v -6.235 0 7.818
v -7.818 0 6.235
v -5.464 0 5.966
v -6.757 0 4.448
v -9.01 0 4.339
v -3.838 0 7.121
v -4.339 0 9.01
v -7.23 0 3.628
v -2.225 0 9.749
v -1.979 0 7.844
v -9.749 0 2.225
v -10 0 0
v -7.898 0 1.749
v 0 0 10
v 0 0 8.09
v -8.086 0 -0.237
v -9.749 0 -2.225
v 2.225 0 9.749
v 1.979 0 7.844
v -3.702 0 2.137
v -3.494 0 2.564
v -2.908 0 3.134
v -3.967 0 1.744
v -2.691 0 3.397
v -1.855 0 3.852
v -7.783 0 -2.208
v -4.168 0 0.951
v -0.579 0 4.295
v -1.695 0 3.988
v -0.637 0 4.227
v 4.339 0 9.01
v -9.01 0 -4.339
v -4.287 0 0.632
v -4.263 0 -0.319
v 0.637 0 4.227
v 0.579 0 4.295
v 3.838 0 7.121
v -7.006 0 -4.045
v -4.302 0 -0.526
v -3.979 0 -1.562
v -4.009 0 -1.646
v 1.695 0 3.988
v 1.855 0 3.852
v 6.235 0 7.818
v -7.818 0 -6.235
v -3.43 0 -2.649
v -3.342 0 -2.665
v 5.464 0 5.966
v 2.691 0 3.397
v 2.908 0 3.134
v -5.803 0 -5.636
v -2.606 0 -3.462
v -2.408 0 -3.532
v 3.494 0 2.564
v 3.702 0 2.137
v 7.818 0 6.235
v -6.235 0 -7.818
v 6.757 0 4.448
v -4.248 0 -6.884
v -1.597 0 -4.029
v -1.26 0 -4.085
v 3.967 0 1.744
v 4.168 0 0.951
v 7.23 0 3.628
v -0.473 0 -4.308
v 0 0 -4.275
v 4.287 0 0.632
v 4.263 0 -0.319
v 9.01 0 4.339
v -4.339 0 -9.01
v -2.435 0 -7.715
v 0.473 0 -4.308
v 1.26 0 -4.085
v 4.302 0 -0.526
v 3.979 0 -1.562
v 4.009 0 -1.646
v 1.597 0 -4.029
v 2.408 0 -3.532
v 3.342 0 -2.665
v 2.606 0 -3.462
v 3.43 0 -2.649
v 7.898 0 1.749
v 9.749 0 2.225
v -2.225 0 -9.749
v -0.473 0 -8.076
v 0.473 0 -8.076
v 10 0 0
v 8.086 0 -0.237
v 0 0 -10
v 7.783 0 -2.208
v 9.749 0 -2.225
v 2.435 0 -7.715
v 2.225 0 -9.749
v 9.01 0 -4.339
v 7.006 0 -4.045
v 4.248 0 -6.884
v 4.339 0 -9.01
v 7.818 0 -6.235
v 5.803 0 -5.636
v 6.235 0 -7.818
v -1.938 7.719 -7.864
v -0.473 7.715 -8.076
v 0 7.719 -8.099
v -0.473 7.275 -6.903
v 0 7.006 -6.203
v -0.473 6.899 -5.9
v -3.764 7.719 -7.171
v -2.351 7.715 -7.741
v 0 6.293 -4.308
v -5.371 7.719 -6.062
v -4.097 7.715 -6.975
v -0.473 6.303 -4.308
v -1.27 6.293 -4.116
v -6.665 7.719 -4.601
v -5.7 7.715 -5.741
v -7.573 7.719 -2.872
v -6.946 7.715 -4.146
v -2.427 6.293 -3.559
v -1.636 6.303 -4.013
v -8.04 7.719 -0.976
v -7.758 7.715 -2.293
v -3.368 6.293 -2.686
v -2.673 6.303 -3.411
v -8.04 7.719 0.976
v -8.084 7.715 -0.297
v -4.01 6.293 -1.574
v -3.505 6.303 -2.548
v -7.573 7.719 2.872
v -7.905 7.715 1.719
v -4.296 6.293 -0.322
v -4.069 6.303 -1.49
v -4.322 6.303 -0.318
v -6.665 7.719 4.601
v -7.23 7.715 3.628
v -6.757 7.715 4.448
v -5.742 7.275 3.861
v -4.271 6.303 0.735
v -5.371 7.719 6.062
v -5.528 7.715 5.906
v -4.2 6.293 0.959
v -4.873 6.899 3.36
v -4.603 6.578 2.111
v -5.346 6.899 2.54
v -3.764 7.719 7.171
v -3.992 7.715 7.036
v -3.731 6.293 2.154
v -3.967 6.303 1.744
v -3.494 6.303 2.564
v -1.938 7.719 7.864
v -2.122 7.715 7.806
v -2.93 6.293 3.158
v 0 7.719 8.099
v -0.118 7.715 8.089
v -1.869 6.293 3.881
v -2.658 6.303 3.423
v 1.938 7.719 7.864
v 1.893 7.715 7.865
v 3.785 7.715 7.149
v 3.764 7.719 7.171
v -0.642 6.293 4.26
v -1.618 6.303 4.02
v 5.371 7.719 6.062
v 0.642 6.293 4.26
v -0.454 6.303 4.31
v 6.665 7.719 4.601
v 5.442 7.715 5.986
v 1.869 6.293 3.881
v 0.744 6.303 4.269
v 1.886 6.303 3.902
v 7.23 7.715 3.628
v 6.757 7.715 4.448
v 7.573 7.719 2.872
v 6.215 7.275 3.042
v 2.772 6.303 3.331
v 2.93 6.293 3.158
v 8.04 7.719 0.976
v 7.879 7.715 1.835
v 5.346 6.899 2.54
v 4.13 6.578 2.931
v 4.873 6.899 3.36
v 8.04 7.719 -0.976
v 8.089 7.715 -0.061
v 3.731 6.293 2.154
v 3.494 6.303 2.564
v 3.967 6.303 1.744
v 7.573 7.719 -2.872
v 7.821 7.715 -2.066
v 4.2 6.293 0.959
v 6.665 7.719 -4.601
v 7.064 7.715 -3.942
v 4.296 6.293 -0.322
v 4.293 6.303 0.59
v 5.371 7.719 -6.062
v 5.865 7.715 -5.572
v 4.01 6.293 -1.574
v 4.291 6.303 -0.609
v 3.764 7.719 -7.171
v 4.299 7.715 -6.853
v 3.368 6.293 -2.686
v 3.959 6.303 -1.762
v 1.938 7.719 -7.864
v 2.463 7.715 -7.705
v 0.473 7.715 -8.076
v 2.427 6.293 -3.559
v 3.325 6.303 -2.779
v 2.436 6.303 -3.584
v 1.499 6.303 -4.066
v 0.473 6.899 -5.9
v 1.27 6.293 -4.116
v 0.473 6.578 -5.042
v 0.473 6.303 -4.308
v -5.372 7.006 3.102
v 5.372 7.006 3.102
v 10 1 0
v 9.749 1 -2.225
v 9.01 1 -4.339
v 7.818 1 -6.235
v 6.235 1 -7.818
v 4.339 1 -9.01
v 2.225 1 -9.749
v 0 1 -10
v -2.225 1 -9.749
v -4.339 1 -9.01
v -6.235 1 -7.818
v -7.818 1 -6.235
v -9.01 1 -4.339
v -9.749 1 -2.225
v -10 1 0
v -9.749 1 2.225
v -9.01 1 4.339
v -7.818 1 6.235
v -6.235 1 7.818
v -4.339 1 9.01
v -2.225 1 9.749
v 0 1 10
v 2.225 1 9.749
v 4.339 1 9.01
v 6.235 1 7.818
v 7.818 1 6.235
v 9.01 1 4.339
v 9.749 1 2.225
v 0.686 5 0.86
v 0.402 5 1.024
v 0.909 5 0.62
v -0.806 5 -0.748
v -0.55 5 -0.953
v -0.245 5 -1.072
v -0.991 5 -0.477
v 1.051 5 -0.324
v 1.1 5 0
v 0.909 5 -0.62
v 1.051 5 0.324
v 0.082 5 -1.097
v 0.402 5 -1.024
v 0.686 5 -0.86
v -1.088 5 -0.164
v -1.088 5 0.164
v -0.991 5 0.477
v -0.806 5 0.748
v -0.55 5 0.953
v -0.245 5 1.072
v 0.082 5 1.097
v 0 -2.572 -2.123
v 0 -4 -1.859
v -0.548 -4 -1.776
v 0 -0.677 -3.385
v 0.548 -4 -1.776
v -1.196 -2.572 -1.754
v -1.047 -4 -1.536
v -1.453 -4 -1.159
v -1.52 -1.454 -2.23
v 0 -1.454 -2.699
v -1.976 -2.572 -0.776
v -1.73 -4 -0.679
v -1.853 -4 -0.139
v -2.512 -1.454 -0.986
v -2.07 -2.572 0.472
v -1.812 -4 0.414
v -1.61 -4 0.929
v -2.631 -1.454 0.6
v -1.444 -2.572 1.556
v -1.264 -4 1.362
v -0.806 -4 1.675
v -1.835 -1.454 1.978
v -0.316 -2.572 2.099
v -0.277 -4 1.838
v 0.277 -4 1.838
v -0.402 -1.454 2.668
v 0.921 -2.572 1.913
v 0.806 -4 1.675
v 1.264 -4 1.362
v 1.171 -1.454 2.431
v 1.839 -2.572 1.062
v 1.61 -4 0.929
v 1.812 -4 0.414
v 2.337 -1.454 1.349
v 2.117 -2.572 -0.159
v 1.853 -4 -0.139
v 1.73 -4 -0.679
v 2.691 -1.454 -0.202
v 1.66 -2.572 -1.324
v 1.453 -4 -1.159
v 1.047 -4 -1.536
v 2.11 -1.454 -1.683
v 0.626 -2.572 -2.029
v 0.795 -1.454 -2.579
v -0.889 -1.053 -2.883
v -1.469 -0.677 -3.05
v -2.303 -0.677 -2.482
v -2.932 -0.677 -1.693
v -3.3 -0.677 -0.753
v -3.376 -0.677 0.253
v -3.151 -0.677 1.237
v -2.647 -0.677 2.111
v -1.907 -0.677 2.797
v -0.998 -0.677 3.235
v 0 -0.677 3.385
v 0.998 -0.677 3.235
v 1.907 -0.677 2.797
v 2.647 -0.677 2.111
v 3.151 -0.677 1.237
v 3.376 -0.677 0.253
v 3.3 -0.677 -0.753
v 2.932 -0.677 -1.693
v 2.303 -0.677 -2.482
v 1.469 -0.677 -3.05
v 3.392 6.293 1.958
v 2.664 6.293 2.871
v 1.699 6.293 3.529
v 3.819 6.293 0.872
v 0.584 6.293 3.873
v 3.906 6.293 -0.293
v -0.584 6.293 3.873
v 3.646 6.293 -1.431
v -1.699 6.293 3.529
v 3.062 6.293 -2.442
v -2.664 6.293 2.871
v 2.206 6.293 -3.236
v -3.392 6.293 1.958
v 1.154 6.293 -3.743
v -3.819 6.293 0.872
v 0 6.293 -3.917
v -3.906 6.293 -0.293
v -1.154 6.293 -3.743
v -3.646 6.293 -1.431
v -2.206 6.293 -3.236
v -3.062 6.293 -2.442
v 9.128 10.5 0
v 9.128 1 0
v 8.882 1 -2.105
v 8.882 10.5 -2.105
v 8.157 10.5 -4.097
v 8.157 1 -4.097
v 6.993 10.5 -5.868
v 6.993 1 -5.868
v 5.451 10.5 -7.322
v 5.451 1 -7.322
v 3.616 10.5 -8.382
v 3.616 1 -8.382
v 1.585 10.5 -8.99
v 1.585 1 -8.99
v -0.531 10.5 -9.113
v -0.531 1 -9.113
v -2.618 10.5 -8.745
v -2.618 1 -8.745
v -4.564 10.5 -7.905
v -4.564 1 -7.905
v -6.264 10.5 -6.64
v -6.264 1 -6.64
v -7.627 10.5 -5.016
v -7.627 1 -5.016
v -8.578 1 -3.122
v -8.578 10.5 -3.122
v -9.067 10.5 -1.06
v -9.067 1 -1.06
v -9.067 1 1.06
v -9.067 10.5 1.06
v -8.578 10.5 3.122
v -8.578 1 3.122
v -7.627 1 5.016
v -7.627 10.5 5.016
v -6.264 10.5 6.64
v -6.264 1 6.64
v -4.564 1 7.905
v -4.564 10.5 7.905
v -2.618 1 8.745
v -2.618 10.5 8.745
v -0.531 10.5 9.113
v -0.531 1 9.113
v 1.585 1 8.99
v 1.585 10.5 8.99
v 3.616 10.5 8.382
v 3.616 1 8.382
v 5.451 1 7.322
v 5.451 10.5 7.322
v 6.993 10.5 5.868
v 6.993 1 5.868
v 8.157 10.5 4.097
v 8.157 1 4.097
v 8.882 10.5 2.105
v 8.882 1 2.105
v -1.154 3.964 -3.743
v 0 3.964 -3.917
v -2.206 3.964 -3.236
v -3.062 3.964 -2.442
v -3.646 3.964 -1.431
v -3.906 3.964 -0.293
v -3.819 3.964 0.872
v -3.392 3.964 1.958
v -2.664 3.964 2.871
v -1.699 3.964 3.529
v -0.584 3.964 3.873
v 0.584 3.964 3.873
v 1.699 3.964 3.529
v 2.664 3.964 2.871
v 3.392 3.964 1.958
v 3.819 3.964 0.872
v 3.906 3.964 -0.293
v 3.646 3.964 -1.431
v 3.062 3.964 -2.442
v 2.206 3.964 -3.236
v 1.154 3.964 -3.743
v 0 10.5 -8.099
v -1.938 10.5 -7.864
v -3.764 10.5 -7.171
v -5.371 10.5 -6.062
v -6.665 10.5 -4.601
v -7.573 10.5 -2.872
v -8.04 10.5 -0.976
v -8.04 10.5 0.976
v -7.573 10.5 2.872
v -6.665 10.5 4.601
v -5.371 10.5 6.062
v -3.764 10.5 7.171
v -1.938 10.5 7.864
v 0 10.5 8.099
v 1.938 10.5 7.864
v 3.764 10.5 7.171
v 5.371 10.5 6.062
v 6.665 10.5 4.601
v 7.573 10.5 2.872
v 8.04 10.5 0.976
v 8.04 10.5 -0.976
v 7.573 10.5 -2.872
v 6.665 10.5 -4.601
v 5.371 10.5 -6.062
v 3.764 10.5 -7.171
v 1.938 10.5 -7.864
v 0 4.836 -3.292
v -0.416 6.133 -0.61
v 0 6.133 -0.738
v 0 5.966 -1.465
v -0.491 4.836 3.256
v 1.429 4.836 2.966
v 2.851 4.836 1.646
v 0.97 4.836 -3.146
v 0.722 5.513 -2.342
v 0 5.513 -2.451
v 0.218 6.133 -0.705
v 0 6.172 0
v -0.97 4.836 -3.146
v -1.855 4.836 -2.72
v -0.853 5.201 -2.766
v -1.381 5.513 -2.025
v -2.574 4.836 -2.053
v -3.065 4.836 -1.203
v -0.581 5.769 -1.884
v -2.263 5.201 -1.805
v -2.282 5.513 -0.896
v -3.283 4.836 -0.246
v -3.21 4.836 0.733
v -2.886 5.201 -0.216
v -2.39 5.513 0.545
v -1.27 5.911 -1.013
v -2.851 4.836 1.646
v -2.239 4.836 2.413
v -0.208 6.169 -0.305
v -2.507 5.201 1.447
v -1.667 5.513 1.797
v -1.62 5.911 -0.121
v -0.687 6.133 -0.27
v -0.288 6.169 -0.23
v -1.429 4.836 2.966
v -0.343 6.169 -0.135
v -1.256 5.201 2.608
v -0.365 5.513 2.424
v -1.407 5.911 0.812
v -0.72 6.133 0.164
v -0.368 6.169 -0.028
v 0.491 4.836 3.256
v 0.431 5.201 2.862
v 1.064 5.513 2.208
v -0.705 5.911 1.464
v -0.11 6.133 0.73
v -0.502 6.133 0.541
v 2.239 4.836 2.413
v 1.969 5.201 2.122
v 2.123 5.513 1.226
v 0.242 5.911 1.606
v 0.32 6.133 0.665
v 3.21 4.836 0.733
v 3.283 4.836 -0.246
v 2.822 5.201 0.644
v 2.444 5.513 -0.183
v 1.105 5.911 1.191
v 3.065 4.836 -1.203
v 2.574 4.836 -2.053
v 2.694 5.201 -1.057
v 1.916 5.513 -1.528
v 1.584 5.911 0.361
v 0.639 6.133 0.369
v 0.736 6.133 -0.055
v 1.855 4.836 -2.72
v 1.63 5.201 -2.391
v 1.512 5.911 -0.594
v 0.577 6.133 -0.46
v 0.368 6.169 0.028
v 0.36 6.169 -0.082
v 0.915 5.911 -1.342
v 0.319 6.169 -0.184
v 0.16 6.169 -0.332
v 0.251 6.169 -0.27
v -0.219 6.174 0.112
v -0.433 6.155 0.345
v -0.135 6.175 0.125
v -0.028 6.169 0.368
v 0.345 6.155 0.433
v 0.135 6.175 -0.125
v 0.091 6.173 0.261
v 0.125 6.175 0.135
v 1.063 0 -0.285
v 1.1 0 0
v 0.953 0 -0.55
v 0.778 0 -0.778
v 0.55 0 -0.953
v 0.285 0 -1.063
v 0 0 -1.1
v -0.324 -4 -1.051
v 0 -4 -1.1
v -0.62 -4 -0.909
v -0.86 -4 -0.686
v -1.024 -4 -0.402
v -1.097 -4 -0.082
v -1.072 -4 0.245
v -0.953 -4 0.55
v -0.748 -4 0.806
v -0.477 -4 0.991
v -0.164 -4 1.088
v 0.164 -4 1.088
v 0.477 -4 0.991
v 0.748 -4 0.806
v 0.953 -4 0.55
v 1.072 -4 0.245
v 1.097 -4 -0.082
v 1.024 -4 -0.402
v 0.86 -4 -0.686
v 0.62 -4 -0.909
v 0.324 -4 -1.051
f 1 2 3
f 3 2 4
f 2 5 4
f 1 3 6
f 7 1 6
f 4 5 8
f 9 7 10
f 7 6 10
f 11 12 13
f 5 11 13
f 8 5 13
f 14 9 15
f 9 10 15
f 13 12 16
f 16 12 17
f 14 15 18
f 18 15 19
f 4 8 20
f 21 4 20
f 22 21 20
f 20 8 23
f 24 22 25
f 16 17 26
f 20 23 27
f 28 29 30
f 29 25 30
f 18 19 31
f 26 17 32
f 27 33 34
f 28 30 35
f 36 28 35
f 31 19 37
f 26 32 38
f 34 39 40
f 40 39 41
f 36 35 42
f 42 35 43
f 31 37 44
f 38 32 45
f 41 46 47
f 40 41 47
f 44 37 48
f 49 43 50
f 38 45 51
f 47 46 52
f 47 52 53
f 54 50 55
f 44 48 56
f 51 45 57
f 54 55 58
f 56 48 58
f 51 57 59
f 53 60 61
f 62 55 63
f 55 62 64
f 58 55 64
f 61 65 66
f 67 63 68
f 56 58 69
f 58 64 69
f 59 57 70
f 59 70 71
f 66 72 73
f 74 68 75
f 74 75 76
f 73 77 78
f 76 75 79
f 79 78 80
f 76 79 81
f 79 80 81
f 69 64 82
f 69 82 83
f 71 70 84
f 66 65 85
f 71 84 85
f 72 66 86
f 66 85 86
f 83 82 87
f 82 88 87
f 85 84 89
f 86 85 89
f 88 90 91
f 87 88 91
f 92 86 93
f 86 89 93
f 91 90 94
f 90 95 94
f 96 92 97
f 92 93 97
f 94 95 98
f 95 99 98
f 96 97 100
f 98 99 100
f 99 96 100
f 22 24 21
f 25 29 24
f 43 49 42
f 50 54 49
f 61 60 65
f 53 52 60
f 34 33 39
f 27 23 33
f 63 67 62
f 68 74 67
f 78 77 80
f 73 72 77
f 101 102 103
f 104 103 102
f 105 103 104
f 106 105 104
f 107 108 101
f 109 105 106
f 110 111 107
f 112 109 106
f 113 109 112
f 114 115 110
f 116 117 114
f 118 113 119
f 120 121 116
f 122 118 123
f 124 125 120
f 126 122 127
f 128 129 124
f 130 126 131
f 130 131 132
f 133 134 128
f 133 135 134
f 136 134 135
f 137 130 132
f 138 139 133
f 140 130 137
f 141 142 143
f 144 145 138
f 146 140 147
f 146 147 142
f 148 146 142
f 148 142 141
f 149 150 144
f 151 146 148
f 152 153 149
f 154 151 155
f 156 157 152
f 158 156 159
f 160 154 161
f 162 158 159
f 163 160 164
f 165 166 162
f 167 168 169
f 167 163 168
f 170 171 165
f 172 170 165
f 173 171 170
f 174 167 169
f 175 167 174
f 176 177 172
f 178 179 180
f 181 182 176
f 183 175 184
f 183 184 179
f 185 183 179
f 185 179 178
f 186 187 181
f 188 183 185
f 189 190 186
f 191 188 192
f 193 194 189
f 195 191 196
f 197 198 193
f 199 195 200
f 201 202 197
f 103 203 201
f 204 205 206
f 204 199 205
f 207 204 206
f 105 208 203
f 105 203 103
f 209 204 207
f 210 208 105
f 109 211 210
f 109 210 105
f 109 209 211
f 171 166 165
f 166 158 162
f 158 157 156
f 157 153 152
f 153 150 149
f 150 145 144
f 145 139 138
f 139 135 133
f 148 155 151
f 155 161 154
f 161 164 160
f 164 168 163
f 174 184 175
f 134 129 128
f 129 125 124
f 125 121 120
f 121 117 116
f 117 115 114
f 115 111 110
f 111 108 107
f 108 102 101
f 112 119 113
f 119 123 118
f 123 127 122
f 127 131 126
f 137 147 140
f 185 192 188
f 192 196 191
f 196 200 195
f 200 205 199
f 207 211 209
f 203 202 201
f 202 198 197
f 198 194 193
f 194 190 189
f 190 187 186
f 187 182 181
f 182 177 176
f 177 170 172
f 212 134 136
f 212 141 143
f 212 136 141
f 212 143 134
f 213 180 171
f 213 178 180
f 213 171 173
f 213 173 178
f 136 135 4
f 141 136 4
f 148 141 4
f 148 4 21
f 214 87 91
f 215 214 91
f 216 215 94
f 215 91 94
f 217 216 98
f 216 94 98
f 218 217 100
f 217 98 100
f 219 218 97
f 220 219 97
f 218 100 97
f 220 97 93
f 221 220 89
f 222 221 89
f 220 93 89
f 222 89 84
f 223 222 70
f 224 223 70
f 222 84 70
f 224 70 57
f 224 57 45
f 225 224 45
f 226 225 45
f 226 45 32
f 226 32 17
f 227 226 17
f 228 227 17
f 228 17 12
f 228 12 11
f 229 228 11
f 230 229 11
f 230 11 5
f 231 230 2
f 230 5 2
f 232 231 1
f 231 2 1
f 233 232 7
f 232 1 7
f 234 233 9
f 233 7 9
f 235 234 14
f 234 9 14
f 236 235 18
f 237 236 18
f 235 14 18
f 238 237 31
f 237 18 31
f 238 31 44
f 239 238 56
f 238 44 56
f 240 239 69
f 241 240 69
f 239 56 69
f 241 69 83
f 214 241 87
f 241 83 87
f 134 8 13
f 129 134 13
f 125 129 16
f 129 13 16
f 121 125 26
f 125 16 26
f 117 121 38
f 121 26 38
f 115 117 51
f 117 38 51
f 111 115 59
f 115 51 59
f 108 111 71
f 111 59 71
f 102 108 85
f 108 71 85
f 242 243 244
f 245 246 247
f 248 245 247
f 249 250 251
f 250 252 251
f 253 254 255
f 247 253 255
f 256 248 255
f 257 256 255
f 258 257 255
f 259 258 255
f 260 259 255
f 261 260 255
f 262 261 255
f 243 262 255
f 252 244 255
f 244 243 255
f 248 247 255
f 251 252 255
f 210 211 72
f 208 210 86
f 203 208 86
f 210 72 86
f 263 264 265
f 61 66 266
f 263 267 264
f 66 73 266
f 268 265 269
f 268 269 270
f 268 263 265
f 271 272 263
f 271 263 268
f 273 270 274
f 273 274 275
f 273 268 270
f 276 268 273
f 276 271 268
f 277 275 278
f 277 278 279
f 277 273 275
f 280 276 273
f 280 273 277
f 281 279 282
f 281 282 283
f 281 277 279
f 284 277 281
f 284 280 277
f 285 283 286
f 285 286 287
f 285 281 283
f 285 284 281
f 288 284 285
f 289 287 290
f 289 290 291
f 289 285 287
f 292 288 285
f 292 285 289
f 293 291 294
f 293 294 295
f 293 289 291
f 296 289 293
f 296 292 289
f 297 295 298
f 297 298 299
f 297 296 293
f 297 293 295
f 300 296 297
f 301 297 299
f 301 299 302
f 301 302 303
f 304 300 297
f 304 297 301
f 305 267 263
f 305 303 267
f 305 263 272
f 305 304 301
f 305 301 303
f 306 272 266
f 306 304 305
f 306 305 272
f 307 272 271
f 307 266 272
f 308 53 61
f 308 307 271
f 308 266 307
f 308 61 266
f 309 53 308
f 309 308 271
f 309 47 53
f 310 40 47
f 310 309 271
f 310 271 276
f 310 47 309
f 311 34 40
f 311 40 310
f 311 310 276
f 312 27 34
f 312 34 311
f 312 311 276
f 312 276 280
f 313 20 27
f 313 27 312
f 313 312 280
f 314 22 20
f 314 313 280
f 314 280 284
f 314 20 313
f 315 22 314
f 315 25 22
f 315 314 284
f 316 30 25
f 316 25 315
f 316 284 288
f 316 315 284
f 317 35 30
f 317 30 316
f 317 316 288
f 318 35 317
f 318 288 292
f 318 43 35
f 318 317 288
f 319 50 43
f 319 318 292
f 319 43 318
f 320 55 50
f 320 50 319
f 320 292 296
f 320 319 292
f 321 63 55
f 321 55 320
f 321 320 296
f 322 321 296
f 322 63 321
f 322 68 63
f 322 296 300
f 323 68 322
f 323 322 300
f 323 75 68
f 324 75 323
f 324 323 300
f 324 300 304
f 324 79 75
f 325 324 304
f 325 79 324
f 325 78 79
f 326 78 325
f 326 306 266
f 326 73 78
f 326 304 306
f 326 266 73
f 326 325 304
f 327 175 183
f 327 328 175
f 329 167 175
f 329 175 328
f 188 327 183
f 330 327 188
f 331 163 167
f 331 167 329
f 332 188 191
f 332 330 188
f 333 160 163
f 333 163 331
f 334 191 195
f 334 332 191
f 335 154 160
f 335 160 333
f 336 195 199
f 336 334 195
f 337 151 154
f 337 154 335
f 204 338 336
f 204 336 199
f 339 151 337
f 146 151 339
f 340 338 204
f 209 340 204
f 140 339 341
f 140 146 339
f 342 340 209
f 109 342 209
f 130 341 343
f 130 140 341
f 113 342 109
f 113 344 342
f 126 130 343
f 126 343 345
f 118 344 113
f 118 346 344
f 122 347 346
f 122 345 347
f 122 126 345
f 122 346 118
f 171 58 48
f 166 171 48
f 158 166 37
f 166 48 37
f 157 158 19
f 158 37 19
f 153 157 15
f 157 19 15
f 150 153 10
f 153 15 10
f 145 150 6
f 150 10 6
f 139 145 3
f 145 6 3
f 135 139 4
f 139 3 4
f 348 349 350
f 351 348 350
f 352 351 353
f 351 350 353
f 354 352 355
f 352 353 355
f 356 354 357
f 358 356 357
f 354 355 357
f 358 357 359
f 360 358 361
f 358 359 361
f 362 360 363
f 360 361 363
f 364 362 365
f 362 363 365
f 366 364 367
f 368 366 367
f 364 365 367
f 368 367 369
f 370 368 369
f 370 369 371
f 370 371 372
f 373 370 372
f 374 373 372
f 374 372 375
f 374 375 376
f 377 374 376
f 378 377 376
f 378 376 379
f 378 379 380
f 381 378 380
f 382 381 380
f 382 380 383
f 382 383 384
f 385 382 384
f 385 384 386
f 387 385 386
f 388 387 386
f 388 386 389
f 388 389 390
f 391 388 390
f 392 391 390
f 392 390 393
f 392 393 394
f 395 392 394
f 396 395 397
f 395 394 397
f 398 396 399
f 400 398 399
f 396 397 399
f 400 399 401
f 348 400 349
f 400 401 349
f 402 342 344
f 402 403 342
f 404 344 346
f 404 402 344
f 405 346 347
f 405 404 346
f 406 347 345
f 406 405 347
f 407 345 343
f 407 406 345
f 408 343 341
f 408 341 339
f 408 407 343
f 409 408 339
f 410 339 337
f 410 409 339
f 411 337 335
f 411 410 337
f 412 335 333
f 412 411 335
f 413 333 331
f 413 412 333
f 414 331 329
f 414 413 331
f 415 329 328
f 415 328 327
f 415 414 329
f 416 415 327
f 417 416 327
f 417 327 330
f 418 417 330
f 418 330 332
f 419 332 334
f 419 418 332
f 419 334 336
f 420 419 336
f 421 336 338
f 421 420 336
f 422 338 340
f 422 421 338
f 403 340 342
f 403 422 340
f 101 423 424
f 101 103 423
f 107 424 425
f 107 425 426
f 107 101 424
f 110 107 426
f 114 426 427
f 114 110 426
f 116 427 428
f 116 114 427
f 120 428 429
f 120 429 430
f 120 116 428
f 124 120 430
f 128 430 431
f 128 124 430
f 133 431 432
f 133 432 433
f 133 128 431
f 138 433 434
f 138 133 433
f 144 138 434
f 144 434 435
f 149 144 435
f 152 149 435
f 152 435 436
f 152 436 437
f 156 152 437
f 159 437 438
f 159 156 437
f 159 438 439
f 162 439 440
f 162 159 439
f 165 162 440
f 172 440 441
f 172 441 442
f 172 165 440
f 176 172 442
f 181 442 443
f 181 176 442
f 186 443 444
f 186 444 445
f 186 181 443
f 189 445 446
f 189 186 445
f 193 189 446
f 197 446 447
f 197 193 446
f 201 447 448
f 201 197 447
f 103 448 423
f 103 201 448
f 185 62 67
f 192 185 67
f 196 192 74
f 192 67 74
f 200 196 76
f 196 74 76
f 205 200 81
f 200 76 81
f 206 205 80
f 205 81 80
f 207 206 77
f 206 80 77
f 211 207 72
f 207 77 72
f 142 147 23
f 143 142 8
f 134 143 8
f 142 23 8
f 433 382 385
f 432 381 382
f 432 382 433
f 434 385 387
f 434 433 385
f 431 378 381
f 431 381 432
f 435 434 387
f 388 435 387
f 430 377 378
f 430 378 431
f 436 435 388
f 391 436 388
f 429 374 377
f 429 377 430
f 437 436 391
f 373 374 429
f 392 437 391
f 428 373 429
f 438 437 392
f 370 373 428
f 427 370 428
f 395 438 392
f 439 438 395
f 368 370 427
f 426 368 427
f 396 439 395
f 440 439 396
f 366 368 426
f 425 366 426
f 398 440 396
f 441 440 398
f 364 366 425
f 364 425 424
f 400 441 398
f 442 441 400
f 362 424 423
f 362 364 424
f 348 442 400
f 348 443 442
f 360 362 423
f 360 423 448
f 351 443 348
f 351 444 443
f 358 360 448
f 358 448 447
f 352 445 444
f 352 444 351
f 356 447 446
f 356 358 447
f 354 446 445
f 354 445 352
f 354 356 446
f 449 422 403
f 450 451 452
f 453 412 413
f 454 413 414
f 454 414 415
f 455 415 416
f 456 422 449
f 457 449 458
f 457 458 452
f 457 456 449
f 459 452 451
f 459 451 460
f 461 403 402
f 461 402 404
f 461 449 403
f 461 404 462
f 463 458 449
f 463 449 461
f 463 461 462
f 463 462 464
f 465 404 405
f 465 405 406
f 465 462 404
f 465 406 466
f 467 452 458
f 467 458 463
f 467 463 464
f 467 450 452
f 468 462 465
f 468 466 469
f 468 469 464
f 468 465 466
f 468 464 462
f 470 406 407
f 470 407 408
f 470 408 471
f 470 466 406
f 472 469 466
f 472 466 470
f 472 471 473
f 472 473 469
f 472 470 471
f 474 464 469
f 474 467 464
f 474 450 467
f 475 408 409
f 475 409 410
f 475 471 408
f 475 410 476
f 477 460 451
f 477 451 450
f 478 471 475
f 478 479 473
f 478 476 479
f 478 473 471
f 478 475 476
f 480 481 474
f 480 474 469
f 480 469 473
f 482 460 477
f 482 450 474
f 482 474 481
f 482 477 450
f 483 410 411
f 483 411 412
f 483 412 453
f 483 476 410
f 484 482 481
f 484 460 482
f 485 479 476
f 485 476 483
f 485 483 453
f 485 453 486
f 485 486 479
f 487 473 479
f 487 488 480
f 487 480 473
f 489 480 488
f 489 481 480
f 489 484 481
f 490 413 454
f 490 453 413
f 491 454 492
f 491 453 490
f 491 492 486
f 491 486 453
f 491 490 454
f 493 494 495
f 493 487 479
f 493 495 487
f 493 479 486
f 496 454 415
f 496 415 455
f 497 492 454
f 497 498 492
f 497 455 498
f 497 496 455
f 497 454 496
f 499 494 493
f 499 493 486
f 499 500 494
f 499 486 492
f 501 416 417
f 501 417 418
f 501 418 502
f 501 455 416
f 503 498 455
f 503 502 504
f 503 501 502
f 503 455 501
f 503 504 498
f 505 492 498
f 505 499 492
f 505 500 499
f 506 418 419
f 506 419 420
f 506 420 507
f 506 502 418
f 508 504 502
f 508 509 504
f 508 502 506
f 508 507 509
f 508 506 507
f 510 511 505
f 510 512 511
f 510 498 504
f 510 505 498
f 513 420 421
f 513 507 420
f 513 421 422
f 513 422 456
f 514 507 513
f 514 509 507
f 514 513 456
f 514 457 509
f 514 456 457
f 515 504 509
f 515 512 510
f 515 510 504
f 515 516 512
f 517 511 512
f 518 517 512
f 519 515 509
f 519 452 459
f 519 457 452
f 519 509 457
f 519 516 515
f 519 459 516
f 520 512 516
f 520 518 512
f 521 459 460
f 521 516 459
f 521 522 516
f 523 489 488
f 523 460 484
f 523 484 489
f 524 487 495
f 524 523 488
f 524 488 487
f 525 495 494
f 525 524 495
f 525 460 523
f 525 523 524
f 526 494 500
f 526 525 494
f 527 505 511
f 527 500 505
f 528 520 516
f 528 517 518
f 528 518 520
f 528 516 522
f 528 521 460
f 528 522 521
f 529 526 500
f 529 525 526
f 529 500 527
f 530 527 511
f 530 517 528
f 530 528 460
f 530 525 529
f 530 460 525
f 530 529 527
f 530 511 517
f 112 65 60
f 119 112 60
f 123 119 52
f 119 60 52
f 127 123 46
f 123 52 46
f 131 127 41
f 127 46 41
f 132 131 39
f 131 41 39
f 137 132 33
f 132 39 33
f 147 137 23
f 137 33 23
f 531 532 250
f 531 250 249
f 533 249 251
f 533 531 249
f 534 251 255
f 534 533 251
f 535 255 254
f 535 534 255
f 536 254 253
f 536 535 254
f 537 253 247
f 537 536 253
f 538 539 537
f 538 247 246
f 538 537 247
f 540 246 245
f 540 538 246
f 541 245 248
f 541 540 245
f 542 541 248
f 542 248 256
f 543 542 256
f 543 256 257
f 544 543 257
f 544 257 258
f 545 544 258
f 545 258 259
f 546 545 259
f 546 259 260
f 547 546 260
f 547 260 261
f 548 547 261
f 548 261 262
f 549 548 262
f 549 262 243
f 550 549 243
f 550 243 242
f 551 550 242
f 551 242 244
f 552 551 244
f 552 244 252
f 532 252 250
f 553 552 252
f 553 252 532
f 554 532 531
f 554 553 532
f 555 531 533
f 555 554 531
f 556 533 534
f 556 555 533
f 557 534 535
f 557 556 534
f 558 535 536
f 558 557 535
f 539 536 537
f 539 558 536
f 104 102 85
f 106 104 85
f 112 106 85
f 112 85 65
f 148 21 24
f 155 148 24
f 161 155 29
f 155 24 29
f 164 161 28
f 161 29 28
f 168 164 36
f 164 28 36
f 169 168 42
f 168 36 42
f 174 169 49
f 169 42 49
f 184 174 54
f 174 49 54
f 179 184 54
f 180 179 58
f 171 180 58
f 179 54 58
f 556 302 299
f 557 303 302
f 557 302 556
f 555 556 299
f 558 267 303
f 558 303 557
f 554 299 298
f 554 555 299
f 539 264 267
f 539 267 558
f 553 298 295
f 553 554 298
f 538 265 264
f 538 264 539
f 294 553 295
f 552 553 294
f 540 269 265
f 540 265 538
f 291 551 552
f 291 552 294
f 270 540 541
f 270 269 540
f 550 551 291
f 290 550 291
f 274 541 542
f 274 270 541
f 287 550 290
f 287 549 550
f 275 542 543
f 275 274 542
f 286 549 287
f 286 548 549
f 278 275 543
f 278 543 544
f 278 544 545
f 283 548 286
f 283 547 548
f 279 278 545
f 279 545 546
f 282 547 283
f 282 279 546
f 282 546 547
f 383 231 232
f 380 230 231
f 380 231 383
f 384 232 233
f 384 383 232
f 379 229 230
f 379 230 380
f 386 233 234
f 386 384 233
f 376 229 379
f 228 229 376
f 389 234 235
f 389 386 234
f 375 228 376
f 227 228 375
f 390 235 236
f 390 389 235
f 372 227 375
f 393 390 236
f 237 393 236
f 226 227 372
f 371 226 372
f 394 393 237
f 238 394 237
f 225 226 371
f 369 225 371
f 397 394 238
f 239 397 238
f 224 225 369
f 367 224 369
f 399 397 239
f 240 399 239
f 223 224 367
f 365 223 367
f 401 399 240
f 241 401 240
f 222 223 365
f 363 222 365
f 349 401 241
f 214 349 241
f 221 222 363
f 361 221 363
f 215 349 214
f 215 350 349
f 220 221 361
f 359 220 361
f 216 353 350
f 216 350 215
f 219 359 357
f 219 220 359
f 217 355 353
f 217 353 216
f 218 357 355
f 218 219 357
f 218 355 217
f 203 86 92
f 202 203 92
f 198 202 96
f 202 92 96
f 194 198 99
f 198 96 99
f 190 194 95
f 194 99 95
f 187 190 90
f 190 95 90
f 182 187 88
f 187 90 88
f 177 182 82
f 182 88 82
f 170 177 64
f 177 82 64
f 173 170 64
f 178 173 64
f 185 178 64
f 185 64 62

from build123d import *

# Parameters (mm, degrees)
SKETCH_1_R          = 10
SKETCH_1_R_2        = 9.128348481
EXTRUDE_2_DEPTH     = 1
SKETCH_1_4_R        = 9.128348481
EXTRUDE_4_DEPTH     = 10.5
SKETCH_1_5_R        = 1.1
CUT_EXTRUDE_1_DEPTH = 5


with BuildPart() as part:
    # 草图1 → 凸台-拉伸2 (new body)
    with BuildSketch(Plane(origin=(0, 0, 0), x_dir=(1, 0, 0), z_dir=(0, 1, 0))):
        Circle(SKETCH_1_R)
        Circle(SKETCH_1_R_2, mode=Mode.SUBTRACT)
    extrude(amount=EXTRUDE_2_DEPTH)

    # 草图1<4> → 凸台-拉伸4 (add)
    with BuildSketch(Plane(origin=(0, 0, 0), x_dir=(1, 0, 0), z_dir=(0, 1, 0))):
        Circle(SKETCH_1_4_R)
        with BuildLine():
            Line((0.473140602, 4.307795347), (0.473140602, 8.075783591))
            ThreePointArc((0.473140602, 8.075783591), (7.005826645, 4.044815899), (7.230404046, -3.628140015))
            Line((7.230404046, -3.628140015), (3.967230505, -1.744145892))
            ThreePointArc((3.967230505, -1.744145892), (3.753095001, 2.166850409), (0.473140602, 4.307795347))
        make_face(mode=Mode.SUBTRACT)
        with BuildLine():
            Line((-0.473140602, 8.075783591), (-0.473140602, 4.307795347))
            ThreePointArc((-0.473140602, 4.307795347), (-3.753095001, 2.166850409), (-3.967230505, -1.744145892))
            Line((-3.967230505, -1.744145892), (-7.230404046, -3.628140015))
            ThreePointArc((-7.230404046, -3.628140015), (-7.005826645, 4.044815899), (-0.473140602, 8.075783591))
        make_face(mode=Mode.SUBTRACT)
        with BuildLine():
            Line((-6.757263444, -4.447643576), (-3.494089903, -2.563649454))
            ThreePointArc((-3.494089903, -2.563649454), (0, -4.333700818), (3.494089903, -2.563649454))
            Line((3.494089903, -2.563649454), (6.757263444, -4.447643576))
            ThreePointArc((6.757263444, -4.447643576), (0, -8.089631799), (-6.757263444, -4.447643576))
        make_face(mode=Mode.SUBTRACT)
    extrude(amount=EXTRUDE_4_DEPTH)

    # 草图2 → 切除-旋转1 (revolve, cut)
    with BuildSketch(Plane(origin=(0, 0, 0), x_dir=(0, 0, -1), z_dir=(1, 0, 0))):
        with BuildLine():
            Line((8.099016848, 10.5), (8.099016848, 7.718955254))
            Line((8.099016848, 7.718955254), (4.307795347, 6.293437734))
            Line((4.307795347, 6.293437734), (3.916728598, 6.293437734))
            Line((3.916728598, 6.293437734), (3.916728598, 3.964130755))
            add(Edge.make_bspline(
                [(3.916728598, 3.964130755), (3.198487501, 5.366870317), (1.55626671, 6.233016223), (0, 6.17174819)],
                knots=[0, 0, 0, 0, 1, 1, 1, 1], degree=3))
            Line((0, 6.17174819), (0, 6.293437734))
            Line((0, 6.293437734), (0, 10.5))
            Line((0, 10.5), (8.099016848, 10.5))
        make_face()
    revolve(axis=Axis((0, 2.702728724, 0), (0, 1, 0)), mode=Mode.SUBTRACT)

    # 草图1<5> → 切除-拉伸1 (cut)
    with BuildSketch(Plane(origin=(0, 0, 0), x_dir=(1, 0, 0), z_dir=(0, 1, 0))):
        Circle(SKETCH_1_5_R)
    extrude(amount=CUT_EXTRUDE_1_DEPTH, mode=Mode.SUBTRACT)

    # 草图3 → 旋转1 (revolve)
    with BuildSketch(Plane(origin=(0, 0, 0), x_dir=(0, 0, -1), z_dir=(1, 0, 0))):
        with BuildLine():
            Line((1.1, 0), (1.1, -4))
            Line((1.1, -4), (1.858610419, -4))
            add(Edge.make_bspline(
                [(1.858610419, -4), (1.970625951, -1.457794417), (4.274857556, 0)],
                knots=[0, 0, 0, 1, 1, 1], degree=2))
            Line((4.274857556, 0), (1.1, 0))
        make_face()
    revolve(axis=Axis((0, -4.725, 0), (0, 1, 0)))


solid = part.part
